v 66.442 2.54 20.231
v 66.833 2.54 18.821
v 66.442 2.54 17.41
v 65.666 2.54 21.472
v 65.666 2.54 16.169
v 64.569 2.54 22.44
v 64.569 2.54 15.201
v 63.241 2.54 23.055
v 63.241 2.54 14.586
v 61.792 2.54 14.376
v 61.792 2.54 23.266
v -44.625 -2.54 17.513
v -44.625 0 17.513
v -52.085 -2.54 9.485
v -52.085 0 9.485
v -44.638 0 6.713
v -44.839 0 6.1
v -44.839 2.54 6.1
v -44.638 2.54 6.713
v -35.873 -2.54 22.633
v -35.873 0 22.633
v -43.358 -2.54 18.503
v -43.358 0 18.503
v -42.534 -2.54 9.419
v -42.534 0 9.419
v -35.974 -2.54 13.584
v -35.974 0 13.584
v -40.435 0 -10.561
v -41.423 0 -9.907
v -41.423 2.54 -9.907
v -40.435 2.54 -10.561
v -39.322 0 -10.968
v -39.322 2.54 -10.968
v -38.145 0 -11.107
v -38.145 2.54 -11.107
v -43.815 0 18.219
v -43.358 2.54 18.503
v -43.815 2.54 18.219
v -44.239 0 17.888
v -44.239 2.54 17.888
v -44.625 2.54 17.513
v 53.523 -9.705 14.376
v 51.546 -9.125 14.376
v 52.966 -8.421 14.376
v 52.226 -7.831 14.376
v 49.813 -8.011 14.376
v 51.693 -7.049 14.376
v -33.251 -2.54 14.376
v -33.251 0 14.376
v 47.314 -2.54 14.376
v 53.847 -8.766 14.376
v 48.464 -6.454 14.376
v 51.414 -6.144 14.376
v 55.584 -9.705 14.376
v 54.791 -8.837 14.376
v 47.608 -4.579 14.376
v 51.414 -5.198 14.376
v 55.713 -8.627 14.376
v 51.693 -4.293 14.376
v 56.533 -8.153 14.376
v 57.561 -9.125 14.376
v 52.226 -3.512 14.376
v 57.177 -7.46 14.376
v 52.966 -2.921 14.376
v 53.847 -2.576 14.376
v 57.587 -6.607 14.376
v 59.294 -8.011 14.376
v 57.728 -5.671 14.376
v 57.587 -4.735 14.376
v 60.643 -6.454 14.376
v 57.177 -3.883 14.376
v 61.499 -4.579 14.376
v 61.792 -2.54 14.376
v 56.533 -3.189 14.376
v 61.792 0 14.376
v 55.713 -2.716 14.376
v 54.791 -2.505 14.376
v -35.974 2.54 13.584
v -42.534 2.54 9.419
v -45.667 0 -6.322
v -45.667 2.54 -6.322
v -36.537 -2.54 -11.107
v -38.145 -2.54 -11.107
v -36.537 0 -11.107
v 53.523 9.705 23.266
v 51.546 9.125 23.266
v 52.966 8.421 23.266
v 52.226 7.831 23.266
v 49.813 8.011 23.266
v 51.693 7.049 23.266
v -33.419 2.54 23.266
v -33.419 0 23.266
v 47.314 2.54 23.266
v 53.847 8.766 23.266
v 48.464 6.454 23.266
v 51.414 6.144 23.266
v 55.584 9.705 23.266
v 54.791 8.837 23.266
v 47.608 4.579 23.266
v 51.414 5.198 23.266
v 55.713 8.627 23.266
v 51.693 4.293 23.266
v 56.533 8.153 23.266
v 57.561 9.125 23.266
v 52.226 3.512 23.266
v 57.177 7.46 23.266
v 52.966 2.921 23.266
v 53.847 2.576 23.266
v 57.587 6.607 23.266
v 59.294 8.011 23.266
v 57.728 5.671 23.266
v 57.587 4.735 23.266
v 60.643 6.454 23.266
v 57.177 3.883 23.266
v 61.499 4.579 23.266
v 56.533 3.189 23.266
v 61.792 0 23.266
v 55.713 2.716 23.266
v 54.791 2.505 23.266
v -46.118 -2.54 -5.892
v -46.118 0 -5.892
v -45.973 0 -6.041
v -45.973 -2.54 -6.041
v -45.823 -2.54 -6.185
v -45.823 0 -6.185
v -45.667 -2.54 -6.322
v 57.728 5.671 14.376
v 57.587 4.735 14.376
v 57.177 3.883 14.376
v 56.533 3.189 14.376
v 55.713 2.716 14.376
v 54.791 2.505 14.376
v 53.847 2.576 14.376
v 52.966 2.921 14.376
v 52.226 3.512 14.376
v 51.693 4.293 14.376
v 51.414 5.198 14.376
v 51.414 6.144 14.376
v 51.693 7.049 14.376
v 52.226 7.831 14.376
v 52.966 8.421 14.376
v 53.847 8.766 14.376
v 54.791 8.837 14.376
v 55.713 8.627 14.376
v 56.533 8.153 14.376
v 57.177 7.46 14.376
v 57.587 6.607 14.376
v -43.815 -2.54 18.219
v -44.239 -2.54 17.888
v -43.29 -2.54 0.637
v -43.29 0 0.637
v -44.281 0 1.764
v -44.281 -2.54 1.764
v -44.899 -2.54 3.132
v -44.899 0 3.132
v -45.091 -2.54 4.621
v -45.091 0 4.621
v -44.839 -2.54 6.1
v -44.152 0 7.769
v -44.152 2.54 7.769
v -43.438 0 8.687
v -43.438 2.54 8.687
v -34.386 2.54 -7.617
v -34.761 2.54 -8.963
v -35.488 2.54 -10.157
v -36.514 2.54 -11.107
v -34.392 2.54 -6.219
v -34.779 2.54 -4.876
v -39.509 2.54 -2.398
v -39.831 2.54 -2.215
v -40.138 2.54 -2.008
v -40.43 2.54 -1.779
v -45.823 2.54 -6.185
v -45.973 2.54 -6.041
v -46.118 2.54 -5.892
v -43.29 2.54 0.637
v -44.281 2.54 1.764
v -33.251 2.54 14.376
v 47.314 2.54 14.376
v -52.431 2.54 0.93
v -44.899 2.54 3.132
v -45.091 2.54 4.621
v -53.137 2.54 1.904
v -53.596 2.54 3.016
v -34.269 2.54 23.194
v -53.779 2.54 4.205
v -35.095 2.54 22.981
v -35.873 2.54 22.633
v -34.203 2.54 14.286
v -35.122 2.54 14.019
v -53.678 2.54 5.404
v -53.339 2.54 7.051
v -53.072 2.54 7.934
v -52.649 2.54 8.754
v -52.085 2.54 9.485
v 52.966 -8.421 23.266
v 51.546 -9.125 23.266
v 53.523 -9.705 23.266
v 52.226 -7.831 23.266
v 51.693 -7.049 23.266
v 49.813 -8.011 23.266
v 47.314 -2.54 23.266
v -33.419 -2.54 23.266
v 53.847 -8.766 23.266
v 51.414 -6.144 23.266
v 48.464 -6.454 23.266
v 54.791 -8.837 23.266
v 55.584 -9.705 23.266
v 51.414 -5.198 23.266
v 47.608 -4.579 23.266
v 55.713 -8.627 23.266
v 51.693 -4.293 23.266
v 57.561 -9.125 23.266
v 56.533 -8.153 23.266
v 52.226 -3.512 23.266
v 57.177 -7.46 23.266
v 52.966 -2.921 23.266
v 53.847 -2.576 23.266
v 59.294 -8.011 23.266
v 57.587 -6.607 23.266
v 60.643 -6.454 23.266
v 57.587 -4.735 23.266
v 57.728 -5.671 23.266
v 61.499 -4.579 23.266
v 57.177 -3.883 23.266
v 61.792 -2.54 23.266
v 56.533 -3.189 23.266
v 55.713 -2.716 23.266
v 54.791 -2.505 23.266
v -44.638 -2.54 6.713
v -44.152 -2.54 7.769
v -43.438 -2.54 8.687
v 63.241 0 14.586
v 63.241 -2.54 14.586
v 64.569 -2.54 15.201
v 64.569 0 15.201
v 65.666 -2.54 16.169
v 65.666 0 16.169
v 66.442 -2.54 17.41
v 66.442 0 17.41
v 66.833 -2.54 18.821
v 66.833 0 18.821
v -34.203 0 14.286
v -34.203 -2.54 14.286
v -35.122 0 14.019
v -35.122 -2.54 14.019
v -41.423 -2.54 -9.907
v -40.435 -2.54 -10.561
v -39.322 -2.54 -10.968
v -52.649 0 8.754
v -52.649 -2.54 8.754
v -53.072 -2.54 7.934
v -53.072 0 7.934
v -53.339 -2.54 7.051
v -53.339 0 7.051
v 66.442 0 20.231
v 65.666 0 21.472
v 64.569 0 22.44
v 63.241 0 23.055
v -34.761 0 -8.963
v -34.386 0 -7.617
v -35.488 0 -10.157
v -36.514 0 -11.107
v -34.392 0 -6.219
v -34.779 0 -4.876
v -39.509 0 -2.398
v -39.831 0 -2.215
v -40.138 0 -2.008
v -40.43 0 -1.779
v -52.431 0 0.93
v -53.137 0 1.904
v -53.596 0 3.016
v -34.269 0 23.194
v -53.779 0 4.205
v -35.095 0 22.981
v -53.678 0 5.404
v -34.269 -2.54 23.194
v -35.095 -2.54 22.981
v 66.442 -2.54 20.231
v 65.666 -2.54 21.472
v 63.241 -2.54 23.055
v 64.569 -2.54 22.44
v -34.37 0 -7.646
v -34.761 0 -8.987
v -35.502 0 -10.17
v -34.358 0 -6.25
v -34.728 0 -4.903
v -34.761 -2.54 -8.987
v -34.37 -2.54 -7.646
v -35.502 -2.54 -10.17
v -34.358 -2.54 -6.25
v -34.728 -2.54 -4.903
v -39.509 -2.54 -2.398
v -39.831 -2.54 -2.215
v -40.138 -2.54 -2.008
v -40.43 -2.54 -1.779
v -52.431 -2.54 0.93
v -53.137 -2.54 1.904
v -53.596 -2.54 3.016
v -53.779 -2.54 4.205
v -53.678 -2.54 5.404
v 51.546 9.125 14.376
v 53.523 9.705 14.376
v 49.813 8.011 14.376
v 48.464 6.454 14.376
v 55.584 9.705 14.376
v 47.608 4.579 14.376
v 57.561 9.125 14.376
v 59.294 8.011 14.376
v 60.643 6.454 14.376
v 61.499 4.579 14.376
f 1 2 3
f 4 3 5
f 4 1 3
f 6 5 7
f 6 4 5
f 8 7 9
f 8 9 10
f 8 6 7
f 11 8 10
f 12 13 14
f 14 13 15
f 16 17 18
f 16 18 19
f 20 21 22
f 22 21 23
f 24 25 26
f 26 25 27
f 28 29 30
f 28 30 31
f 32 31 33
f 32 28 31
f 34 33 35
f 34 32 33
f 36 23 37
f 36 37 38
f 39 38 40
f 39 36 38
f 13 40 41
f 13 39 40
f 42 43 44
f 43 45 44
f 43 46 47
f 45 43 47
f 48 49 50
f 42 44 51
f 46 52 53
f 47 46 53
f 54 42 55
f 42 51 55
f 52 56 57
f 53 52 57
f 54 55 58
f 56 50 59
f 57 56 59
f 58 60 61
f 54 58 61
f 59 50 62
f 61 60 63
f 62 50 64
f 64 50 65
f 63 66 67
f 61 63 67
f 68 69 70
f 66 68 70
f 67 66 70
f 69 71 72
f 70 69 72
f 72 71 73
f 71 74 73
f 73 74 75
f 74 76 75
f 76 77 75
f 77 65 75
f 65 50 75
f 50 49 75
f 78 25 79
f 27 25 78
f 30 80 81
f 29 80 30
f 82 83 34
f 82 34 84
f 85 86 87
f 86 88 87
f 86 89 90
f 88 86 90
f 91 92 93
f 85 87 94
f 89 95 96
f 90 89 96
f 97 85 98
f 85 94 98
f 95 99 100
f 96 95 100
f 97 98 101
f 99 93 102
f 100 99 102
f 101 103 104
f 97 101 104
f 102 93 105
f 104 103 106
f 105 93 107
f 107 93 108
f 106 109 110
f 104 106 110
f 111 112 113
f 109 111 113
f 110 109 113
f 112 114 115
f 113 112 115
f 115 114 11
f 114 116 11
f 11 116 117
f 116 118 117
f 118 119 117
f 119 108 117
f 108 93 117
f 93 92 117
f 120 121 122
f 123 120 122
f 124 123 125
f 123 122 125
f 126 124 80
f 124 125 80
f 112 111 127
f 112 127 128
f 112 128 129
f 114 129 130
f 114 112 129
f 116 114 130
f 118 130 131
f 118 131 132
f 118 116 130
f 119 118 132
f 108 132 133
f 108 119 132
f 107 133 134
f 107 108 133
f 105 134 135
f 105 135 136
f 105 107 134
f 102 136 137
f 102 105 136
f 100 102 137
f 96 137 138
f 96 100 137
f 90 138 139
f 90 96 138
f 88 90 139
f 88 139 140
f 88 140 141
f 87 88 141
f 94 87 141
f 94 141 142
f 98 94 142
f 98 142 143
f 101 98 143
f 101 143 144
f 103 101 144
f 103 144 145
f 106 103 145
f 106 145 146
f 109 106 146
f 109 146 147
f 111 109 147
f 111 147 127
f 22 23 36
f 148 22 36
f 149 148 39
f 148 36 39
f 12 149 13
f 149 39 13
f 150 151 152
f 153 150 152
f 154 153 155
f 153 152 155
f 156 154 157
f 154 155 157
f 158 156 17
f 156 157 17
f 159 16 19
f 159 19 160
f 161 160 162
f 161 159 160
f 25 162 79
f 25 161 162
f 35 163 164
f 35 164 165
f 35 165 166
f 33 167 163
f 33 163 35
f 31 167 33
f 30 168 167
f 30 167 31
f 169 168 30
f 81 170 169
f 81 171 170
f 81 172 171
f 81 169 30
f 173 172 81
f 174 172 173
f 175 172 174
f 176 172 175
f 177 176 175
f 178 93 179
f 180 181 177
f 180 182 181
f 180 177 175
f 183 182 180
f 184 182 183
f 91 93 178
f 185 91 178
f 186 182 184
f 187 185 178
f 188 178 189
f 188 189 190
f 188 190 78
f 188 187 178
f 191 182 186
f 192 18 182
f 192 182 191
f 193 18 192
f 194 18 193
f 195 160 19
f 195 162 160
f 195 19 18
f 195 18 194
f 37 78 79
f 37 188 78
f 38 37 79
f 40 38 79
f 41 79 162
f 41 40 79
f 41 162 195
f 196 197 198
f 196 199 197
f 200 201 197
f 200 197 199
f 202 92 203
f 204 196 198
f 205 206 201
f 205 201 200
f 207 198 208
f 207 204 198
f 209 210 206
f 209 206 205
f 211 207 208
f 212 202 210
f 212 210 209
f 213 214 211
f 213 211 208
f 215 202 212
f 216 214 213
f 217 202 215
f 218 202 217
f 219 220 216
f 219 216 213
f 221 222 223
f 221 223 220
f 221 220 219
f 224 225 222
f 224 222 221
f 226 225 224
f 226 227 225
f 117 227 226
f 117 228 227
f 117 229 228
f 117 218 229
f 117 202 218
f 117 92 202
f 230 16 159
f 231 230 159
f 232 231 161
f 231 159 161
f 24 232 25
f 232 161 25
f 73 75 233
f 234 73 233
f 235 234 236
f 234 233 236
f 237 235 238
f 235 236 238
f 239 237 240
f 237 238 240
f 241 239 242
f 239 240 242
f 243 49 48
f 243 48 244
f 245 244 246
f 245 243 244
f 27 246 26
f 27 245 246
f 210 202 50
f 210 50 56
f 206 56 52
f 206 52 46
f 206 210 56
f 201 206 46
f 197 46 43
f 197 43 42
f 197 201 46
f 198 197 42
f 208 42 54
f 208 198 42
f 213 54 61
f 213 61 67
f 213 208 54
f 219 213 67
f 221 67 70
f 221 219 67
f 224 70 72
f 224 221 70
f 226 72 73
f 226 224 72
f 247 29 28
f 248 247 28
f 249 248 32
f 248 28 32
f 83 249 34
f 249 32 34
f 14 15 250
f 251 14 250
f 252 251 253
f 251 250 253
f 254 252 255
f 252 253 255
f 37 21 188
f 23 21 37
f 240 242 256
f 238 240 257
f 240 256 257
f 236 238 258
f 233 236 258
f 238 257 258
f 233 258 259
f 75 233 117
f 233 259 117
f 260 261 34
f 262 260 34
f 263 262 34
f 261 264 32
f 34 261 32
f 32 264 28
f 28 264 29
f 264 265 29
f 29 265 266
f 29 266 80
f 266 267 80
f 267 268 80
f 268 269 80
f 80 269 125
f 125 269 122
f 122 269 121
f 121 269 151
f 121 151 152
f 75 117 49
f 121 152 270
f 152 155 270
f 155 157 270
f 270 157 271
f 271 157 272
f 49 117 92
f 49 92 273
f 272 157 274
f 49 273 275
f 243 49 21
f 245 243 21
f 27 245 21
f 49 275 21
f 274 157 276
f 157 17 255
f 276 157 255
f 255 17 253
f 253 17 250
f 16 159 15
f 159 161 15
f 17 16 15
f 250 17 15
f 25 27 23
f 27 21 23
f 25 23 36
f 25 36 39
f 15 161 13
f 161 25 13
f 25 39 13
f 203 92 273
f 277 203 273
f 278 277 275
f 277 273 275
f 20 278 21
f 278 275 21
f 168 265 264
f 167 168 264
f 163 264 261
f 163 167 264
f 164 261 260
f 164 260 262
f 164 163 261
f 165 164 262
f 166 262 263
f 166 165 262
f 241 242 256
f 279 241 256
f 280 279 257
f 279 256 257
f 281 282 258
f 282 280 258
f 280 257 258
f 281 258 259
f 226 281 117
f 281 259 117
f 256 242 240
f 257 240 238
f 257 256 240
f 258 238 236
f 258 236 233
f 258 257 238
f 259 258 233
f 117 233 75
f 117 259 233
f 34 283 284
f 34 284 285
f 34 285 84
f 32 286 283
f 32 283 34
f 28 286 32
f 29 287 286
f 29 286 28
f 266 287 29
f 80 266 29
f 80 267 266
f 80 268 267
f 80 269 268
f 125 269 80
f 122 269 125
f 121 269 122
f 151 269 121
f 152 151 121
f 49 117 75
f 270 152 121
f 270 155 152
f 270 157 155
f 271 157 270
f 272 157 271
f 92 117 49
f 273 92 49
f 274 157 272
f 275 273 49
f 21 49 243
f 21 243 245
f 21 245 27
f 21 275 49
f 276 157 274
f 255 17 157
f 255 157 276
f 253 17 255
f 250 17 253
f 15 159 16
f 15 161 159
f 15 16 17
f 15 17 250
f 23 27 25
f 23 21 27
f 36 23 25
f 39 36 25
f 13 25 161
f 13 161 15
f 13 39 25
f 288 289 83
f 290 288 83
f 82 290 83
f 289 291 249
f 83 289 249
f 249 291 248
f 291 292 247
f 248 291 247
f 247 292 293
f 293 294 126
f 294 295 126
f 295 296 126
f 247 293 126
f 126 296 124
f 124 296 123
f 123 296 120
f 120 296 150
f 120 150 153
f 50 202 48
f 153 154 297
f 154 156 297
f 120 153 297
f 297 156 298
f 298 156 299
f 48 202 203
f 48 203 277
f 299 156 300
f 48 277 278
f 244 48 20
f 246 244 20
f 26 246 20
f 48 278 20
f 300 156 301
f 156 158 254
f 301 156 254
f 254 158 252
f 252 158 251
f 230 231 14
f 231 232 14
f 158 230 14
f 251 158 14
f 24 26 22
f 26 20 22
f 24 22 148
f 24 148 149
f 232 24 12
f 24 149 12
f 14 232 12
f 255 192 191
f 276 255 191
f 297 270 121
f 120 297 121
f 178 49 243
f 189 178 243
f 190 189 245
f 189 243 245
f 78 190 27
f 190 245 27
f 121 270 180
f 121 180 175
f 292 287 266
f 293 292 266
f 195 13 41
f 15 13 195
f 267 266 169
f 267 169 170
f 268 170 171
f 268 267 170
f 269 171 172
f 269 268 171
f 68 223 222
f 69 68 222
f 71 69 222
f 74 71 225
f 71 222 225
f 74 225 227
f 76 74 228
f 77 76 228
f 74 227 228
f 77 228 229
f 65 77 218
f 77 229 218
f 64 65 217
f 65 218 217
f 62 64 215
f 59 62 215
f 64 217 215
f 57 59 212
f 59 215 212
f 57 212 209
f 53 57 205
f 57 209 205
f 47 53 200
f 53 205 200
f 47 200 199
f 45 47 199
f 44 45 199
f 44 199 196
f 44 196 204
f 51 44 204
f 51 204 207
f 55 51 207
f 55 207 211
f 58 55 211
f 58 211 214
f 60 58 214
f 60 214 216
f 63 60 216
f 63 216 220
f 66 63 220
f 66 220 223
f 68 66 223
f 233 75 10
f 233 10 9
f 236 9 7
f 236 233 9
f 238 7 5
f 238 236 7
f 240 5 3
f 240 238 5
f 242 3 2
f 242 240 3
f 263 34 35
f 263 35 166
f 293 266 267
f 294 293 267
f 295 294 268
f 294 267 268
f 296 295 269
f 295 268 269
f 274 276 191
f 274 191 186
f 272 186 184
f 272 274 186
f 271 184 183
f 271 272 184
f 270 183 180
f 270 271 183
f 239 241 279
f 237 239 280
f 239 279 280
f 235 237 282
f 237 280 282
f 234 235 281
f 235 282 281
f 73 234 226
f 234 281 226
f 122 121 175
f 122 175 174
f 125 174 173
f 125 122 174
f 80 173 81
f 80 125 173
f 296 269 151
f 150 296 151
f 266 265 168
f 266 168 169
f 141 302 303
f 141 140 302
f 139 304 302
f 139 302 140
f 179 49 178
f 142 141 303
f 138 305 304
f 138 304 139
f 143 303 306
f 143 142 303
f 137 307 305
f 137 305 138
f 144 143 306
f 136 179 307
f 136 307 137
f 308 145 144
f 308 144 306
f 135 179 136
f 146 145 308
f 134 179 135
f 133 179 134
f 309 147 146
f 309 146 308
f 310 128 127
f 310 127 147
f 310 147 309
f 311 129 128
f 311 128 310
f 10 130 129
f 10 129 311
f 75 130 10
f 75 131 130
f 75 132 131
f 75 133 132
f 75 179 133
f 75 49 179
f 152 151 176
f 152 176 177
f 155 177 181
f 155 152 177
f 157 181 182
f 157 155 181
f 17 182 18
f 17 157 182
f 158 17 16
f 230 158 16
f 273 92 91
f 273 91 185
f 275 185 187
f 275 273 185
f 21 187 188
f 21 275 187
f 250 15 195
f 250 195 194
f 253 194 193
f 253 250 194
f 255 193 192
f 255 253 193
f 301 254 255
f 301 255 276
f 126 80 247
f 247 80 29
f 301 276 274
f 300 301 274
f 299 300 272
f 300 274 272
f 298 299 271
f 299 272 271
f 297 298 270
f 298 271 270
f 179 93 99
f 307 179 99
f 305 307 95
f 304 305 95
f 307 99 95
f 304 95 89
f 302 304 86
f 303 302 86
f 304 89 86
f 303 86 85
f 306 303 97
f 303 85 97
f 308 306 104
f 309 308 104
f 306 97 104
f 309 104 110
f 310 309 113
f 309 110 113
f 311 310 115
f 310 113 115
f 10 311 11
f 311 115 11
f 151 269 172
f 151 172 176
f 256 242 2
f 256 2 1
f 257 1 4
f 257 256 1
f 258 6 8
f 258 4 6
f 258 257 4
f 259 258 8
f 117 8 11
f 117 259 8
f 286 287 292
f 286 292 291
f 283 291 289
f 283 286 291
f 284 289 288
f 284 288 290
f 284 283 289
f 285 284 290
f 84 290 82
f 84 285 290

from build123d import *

# Parameters (mm, degrees)
F1_DEPTH      = 2.54
F2_T1_DEPTH   = 2.54
F2_T3_DEPTH   = 27.94
F2_T5_DEPTH   = 9.0828624111
F2_T7_DEPTH   = 6.6115491723
F2_T9_DEPTH   = 9.6489143737
F2_T11_DEPTH  = 15.5954084718
F2_T13_DEPTH  = 4.1000627259
F2_T15_DEPTH  = 11.8324981012
F4_DEPTH      = 8.89
F5_R          = 3.175
F6_DEPTH      = 25.4
F8_T1_DEPTH   = 27.7469499795
F8_2_T1_DEPTH = 27.8579477964


# Not quite as in the source:
# - a fillet or chamfer that OpenCascade refuses, or shapes differently, is made with other operations: its cross-section is extruded or revolved along the edge and cut away or added


with BuildPart() as f1:
    # F0 (on Front) → F1 (new body)
    with BuildSketch(Plane.XZ):
        Polygon((66.8724340558, 14.3756293181), (66.8724340558, 23.2656293181), (-34.7275659442, 23.2656293181), (-44.0710447729, 18.1098952889), (-53.0527345836, 8.4431990981), (-54.2040504515, 2.8466905933), (-45.9056608379, -6.1207453094), (-40.0034040213, -11.1067253005), (-36.5135949825, -11.1067253005), (-32.4798657579, -8.7494706538), (-34.7275659442, -4.9032107927), (-40.0034040213, -2.1392893977), (-45.9056608379, 2.8466905933), (-44.0710447729, 8.4431990981), (-34.7275659442, 14.3756293181), align=None)
    extrude(amount=F1_DEPTH)

    # F2: fillet of radius 5.08 on 12 edges, made by hand

    # F2_s2 → F2_t1 (join)
    with BuildSketch(Plane.XZ):
        with BuildLine():
            ThreePointArc((-33.2510846992, 14.3756293181), (-34.6688950832, 14.1737656134), (-35.9740265471, 13.5842173949))
            Line((-35.9740265471, 13.5842173949), (-34.7275659442, 14.3756293181))
            Line((-34.7275659442, 14.3756293181), (-33.2510846992, 14.3756293181))
        make_face()
        with BuildLine():
            ThreePointArc((-39.5089784479, -2.398310505), (-39.9863438705, -2.1139198711), (-40.4297931043, -1.7790937128))
            Line((-40.4297931043, -1.7790937128), (-40.0034040213, -2.1392893977))
            Line((-40.0034040213, -2.1392893977), (-39.5089784479, -2.398310505))
        make_face()
        with BuildLine():
            ThreePointArc((-43.2900772259, 0.6371548243), (-44.8991857722, 3.1320672478), (-44.8390917989, 6.1002665384))
            Line((-44.8390917989, 6.1002665384), (-45.9056608379, 2.8466905933))
            Line((-45.9056608379, 2.8466905933), (-43.2900772259, 0.6371548243))
        make_face()
        with BuildLine():
            ThreePointArc((-44.6382251268, 6.7130116573), (-43.8212350308, 8.2489469203), (-42.5339230923, 9.419159688))
            Line((-42.5339230923, 9.419159688), (-44.0710447729, 8.4431990981))
            Line((-44.0710447729, 8.4431990981), (-44.6382251268, 6.7130116573))
        make_face()
    extrude(amount=F2_T1_DEPTH)

    # F2_s4 → F2_t3 (cut)
    with BuildSketch(Plane.XZ.offset(-12.7)):
        with BuildLine():
            ThreePointArc((61.7924340558, 14.3756293181), (65.3845365042, 15.8635268697), (66.8724340558, 19.4556293181))
            Line((66.8724340558, 19.4556293181), (66.8724340558, 14.3756293181))
            Line((66.8724340558, 14.3756293181), (61.7924340558, 14.3756293181))
        make_face()
        with BuildLine():
            ThreePointArc((66.8724340558, 18.1856293181), (65.3845365042, 21.7777317665), (61.7924340558, 23.2656293181))
            Line((61.7924340558, 23.2656293181), (66.8724340558, 23.2656293181))
            Line((66.8724340558, 23.2656293181), (66.8724340558, 18.1856293181))
        make_face()
    extrude(amount=F2_T3_DEPTH, mode=Mode.SUBTRACT)

    # F2_s6 → F2_t5 (cut)
    with BuildSketch(Plane.XZ.offset(-3.2714312055)):
        with BuildLine():
            ThreePointArc((-33.418993462, 23.2656293181), (-34.6861989643, 23.1050388573), (-35.8732859172, 22.6334207413))
            Line((-35.8732859172, 22.6334207413), (-34.7275659442, 23.2656293181))
            Line((-34.7275659442, 23.2656293181), (-33.418993462, 23.2656293181))
        make_face()
    extrude(amount=F2_T5_DEPTH, mode=Mode.SUBTRACT)

    # F2_s8 → F2_t7 (cut)
    with BuildSketch(Plane.XZ.offset(-2.0357745861)):
        with BuildLine():
            ThreePointArc((-43.3580762104, 18.5033115257), (-44.0311208398, 18.0587891116), (-44.625324101, 17.513342749))
            Line((-44.625324101, 17.513342749), (-44.0710447729, 18.1098952889))
            Line((-44.0710447729, 18.1098952889), (-43.3580762104, 18.5033115257))
        make_face()
    extrude(amount=F2_T7_DEPTH, mode=Mode.SUBTRACT)

    # F2_s10 → F2_t9 (cut)
    with BuildSketch(Plane.XZ.offset(-3.5544571868)):
        with BuildLine():
            ThreePointArc((-52.0849643036, 9.4847782972), (-52.8792037753, 8.3537845313), (-53.3392248579, 7.0505793131))
            Line((-53.3392248579, 7.0505793131), (-53.0527345836, 8.4431990981))
            Line((-53.0527345836, 8.4431990981), (-52.0849643036, 9.4847782972))
        make_face()
    extrude(amount=F2_T9_DEPTH, mode=Mode.SUBTRACT)

    # F2_s12 → F2_t11 (cut)
    with BuildSketch(Plane.XZ.offset(-6.5277042359)):
        with BuildLine():
            ThreePointArc((-53.6779156077, 5.404214736), (-53.5955025606, 3.016349409), (-52.4306120015, 0.9302710989))
            Line((-52.4306120015, 0.9302710989), (-54.2040504515, 2.8466905933))
            Line((-54.2040504515, 2.8466905933), (-53.6779156077, 5.404214736))
        make_face()
    extrude(amount=F2_T11_DEPTH, mode=Mode.SUBTRACT)

    # F2_s14 → F2_t13 (cut)
    with BuildSketch(Plane.XZ.offset(-0.780031363)):
        with BuildLine():
            ThreePointArc((-46.1175787743, -5.8917417798), (-45.8990465897, -6.1138249598), (-45.6673107898, -6.3220934729))
            Line((-45.6673107898, -6.3220934729), (-45.9056608379, -6.1207453094))
            Line((-45.9056608379, -6.1207453094), (-46.1175787743, -5.8917417798))
        make_face()
    extrude(amount=F2_T13_DEPTH, mode=Mode.SUBTRACT)

    # F2_s16 → F2_t15 (cut)
    with BuildSketch(Plane.XZ.offset(-4.6462490506)):
        with BuildLine():
            ThreePointArc((-41.4231337105, -9.9073969684), (-39.890267963, -10.7974805904), (-38.144904401, -11.1067253005))
            Line((-38.144904401, -11.1067253005), (-40.0034040213, -11.1067253005))
            Line((-40.0034040213, -11.1067253005), (-41.4231337105, -9.9073969684))
        make_face()
    extrude(amount=F2_T15_DEPTH, mode=Mode.SUBTRACT)

    # F3 (on face) → F4 (join, through all)
    with BuildSketch(Plane.XY.offset(23.2656293181)):
        with BuildLine():
            Line((61.7924340558, -2.54), (47.3144340558, -2.54))
            ThreePointArc((47.3144340558, -2.54), (54.5534340558, -9.779), (61.7924340558, -2.54))
        make_face()
    extrude(amount=-F4_DEPTH)

    # F5 (on face) → F6 (cut)
    with BuildSketch(Plane.XY.offset(23.2656293181)):
        with Locations((54.5534340558, -5.6710629724)):
            Circle(F5_R)
    extrude(amount=-F6_DEPTH, mode=Mode.SUBTRACT)


with BuildPart() as f7_1:
    # F7: instance of F1
    add(f1.part.mirror(Plane.XZ))

    # F8#2: fillet of radius 5.08 on 1 edges, made by hand

    # F8_2_s2 → F8_2_t1 (cut)
    with BuildSketch(Plane.XZ.offset(-15.1989738982)):
        with BuildLine():
            ThreePointArc((-35.0346945081, -4.3776530361), (-34.4590954637, -8.0312077626), (-36.5135949825, -11.1067253005))
            Line((-36.5135949825, -11.1067253005), (-32.4798657579, -8.7494706538))
            Line((-32.4798657579, -8.7494706538), (-35.0346945081, -4.3776530361))
        make_face()
    extrude(amount=F8_2_T1_DEPTH, mode=Mode.SUBTRACT)


with BuildPart() as f1_1:
    add(f1.part)

    # F8: fillet of radius 5.08 on 1 edges, made by hand

    # F8_s2 → F8_t1 (cut)
    with BuildSketch(Plane.XZ.offset(-12.6034749897)):
        with BuildLine():
            ThreePointArc((-34.7275659442, -4.9032107927), (-34.5706782086, -8.4965419394), (-36.8325166478, -11.2930986378))
            Line((-36.8325166478, -11.2930986378), (-32.4798657579, -8.7494706538))
            Line((-32.4798657579, -8.7494706538), (-34.7275659442, -4.9032107927))
        make_face()
    extrude(amount=F8_T1_DEPTH, mode=Mode.SUBTRACT)


solid = Compound([f7_1.part, f1_1.part])
